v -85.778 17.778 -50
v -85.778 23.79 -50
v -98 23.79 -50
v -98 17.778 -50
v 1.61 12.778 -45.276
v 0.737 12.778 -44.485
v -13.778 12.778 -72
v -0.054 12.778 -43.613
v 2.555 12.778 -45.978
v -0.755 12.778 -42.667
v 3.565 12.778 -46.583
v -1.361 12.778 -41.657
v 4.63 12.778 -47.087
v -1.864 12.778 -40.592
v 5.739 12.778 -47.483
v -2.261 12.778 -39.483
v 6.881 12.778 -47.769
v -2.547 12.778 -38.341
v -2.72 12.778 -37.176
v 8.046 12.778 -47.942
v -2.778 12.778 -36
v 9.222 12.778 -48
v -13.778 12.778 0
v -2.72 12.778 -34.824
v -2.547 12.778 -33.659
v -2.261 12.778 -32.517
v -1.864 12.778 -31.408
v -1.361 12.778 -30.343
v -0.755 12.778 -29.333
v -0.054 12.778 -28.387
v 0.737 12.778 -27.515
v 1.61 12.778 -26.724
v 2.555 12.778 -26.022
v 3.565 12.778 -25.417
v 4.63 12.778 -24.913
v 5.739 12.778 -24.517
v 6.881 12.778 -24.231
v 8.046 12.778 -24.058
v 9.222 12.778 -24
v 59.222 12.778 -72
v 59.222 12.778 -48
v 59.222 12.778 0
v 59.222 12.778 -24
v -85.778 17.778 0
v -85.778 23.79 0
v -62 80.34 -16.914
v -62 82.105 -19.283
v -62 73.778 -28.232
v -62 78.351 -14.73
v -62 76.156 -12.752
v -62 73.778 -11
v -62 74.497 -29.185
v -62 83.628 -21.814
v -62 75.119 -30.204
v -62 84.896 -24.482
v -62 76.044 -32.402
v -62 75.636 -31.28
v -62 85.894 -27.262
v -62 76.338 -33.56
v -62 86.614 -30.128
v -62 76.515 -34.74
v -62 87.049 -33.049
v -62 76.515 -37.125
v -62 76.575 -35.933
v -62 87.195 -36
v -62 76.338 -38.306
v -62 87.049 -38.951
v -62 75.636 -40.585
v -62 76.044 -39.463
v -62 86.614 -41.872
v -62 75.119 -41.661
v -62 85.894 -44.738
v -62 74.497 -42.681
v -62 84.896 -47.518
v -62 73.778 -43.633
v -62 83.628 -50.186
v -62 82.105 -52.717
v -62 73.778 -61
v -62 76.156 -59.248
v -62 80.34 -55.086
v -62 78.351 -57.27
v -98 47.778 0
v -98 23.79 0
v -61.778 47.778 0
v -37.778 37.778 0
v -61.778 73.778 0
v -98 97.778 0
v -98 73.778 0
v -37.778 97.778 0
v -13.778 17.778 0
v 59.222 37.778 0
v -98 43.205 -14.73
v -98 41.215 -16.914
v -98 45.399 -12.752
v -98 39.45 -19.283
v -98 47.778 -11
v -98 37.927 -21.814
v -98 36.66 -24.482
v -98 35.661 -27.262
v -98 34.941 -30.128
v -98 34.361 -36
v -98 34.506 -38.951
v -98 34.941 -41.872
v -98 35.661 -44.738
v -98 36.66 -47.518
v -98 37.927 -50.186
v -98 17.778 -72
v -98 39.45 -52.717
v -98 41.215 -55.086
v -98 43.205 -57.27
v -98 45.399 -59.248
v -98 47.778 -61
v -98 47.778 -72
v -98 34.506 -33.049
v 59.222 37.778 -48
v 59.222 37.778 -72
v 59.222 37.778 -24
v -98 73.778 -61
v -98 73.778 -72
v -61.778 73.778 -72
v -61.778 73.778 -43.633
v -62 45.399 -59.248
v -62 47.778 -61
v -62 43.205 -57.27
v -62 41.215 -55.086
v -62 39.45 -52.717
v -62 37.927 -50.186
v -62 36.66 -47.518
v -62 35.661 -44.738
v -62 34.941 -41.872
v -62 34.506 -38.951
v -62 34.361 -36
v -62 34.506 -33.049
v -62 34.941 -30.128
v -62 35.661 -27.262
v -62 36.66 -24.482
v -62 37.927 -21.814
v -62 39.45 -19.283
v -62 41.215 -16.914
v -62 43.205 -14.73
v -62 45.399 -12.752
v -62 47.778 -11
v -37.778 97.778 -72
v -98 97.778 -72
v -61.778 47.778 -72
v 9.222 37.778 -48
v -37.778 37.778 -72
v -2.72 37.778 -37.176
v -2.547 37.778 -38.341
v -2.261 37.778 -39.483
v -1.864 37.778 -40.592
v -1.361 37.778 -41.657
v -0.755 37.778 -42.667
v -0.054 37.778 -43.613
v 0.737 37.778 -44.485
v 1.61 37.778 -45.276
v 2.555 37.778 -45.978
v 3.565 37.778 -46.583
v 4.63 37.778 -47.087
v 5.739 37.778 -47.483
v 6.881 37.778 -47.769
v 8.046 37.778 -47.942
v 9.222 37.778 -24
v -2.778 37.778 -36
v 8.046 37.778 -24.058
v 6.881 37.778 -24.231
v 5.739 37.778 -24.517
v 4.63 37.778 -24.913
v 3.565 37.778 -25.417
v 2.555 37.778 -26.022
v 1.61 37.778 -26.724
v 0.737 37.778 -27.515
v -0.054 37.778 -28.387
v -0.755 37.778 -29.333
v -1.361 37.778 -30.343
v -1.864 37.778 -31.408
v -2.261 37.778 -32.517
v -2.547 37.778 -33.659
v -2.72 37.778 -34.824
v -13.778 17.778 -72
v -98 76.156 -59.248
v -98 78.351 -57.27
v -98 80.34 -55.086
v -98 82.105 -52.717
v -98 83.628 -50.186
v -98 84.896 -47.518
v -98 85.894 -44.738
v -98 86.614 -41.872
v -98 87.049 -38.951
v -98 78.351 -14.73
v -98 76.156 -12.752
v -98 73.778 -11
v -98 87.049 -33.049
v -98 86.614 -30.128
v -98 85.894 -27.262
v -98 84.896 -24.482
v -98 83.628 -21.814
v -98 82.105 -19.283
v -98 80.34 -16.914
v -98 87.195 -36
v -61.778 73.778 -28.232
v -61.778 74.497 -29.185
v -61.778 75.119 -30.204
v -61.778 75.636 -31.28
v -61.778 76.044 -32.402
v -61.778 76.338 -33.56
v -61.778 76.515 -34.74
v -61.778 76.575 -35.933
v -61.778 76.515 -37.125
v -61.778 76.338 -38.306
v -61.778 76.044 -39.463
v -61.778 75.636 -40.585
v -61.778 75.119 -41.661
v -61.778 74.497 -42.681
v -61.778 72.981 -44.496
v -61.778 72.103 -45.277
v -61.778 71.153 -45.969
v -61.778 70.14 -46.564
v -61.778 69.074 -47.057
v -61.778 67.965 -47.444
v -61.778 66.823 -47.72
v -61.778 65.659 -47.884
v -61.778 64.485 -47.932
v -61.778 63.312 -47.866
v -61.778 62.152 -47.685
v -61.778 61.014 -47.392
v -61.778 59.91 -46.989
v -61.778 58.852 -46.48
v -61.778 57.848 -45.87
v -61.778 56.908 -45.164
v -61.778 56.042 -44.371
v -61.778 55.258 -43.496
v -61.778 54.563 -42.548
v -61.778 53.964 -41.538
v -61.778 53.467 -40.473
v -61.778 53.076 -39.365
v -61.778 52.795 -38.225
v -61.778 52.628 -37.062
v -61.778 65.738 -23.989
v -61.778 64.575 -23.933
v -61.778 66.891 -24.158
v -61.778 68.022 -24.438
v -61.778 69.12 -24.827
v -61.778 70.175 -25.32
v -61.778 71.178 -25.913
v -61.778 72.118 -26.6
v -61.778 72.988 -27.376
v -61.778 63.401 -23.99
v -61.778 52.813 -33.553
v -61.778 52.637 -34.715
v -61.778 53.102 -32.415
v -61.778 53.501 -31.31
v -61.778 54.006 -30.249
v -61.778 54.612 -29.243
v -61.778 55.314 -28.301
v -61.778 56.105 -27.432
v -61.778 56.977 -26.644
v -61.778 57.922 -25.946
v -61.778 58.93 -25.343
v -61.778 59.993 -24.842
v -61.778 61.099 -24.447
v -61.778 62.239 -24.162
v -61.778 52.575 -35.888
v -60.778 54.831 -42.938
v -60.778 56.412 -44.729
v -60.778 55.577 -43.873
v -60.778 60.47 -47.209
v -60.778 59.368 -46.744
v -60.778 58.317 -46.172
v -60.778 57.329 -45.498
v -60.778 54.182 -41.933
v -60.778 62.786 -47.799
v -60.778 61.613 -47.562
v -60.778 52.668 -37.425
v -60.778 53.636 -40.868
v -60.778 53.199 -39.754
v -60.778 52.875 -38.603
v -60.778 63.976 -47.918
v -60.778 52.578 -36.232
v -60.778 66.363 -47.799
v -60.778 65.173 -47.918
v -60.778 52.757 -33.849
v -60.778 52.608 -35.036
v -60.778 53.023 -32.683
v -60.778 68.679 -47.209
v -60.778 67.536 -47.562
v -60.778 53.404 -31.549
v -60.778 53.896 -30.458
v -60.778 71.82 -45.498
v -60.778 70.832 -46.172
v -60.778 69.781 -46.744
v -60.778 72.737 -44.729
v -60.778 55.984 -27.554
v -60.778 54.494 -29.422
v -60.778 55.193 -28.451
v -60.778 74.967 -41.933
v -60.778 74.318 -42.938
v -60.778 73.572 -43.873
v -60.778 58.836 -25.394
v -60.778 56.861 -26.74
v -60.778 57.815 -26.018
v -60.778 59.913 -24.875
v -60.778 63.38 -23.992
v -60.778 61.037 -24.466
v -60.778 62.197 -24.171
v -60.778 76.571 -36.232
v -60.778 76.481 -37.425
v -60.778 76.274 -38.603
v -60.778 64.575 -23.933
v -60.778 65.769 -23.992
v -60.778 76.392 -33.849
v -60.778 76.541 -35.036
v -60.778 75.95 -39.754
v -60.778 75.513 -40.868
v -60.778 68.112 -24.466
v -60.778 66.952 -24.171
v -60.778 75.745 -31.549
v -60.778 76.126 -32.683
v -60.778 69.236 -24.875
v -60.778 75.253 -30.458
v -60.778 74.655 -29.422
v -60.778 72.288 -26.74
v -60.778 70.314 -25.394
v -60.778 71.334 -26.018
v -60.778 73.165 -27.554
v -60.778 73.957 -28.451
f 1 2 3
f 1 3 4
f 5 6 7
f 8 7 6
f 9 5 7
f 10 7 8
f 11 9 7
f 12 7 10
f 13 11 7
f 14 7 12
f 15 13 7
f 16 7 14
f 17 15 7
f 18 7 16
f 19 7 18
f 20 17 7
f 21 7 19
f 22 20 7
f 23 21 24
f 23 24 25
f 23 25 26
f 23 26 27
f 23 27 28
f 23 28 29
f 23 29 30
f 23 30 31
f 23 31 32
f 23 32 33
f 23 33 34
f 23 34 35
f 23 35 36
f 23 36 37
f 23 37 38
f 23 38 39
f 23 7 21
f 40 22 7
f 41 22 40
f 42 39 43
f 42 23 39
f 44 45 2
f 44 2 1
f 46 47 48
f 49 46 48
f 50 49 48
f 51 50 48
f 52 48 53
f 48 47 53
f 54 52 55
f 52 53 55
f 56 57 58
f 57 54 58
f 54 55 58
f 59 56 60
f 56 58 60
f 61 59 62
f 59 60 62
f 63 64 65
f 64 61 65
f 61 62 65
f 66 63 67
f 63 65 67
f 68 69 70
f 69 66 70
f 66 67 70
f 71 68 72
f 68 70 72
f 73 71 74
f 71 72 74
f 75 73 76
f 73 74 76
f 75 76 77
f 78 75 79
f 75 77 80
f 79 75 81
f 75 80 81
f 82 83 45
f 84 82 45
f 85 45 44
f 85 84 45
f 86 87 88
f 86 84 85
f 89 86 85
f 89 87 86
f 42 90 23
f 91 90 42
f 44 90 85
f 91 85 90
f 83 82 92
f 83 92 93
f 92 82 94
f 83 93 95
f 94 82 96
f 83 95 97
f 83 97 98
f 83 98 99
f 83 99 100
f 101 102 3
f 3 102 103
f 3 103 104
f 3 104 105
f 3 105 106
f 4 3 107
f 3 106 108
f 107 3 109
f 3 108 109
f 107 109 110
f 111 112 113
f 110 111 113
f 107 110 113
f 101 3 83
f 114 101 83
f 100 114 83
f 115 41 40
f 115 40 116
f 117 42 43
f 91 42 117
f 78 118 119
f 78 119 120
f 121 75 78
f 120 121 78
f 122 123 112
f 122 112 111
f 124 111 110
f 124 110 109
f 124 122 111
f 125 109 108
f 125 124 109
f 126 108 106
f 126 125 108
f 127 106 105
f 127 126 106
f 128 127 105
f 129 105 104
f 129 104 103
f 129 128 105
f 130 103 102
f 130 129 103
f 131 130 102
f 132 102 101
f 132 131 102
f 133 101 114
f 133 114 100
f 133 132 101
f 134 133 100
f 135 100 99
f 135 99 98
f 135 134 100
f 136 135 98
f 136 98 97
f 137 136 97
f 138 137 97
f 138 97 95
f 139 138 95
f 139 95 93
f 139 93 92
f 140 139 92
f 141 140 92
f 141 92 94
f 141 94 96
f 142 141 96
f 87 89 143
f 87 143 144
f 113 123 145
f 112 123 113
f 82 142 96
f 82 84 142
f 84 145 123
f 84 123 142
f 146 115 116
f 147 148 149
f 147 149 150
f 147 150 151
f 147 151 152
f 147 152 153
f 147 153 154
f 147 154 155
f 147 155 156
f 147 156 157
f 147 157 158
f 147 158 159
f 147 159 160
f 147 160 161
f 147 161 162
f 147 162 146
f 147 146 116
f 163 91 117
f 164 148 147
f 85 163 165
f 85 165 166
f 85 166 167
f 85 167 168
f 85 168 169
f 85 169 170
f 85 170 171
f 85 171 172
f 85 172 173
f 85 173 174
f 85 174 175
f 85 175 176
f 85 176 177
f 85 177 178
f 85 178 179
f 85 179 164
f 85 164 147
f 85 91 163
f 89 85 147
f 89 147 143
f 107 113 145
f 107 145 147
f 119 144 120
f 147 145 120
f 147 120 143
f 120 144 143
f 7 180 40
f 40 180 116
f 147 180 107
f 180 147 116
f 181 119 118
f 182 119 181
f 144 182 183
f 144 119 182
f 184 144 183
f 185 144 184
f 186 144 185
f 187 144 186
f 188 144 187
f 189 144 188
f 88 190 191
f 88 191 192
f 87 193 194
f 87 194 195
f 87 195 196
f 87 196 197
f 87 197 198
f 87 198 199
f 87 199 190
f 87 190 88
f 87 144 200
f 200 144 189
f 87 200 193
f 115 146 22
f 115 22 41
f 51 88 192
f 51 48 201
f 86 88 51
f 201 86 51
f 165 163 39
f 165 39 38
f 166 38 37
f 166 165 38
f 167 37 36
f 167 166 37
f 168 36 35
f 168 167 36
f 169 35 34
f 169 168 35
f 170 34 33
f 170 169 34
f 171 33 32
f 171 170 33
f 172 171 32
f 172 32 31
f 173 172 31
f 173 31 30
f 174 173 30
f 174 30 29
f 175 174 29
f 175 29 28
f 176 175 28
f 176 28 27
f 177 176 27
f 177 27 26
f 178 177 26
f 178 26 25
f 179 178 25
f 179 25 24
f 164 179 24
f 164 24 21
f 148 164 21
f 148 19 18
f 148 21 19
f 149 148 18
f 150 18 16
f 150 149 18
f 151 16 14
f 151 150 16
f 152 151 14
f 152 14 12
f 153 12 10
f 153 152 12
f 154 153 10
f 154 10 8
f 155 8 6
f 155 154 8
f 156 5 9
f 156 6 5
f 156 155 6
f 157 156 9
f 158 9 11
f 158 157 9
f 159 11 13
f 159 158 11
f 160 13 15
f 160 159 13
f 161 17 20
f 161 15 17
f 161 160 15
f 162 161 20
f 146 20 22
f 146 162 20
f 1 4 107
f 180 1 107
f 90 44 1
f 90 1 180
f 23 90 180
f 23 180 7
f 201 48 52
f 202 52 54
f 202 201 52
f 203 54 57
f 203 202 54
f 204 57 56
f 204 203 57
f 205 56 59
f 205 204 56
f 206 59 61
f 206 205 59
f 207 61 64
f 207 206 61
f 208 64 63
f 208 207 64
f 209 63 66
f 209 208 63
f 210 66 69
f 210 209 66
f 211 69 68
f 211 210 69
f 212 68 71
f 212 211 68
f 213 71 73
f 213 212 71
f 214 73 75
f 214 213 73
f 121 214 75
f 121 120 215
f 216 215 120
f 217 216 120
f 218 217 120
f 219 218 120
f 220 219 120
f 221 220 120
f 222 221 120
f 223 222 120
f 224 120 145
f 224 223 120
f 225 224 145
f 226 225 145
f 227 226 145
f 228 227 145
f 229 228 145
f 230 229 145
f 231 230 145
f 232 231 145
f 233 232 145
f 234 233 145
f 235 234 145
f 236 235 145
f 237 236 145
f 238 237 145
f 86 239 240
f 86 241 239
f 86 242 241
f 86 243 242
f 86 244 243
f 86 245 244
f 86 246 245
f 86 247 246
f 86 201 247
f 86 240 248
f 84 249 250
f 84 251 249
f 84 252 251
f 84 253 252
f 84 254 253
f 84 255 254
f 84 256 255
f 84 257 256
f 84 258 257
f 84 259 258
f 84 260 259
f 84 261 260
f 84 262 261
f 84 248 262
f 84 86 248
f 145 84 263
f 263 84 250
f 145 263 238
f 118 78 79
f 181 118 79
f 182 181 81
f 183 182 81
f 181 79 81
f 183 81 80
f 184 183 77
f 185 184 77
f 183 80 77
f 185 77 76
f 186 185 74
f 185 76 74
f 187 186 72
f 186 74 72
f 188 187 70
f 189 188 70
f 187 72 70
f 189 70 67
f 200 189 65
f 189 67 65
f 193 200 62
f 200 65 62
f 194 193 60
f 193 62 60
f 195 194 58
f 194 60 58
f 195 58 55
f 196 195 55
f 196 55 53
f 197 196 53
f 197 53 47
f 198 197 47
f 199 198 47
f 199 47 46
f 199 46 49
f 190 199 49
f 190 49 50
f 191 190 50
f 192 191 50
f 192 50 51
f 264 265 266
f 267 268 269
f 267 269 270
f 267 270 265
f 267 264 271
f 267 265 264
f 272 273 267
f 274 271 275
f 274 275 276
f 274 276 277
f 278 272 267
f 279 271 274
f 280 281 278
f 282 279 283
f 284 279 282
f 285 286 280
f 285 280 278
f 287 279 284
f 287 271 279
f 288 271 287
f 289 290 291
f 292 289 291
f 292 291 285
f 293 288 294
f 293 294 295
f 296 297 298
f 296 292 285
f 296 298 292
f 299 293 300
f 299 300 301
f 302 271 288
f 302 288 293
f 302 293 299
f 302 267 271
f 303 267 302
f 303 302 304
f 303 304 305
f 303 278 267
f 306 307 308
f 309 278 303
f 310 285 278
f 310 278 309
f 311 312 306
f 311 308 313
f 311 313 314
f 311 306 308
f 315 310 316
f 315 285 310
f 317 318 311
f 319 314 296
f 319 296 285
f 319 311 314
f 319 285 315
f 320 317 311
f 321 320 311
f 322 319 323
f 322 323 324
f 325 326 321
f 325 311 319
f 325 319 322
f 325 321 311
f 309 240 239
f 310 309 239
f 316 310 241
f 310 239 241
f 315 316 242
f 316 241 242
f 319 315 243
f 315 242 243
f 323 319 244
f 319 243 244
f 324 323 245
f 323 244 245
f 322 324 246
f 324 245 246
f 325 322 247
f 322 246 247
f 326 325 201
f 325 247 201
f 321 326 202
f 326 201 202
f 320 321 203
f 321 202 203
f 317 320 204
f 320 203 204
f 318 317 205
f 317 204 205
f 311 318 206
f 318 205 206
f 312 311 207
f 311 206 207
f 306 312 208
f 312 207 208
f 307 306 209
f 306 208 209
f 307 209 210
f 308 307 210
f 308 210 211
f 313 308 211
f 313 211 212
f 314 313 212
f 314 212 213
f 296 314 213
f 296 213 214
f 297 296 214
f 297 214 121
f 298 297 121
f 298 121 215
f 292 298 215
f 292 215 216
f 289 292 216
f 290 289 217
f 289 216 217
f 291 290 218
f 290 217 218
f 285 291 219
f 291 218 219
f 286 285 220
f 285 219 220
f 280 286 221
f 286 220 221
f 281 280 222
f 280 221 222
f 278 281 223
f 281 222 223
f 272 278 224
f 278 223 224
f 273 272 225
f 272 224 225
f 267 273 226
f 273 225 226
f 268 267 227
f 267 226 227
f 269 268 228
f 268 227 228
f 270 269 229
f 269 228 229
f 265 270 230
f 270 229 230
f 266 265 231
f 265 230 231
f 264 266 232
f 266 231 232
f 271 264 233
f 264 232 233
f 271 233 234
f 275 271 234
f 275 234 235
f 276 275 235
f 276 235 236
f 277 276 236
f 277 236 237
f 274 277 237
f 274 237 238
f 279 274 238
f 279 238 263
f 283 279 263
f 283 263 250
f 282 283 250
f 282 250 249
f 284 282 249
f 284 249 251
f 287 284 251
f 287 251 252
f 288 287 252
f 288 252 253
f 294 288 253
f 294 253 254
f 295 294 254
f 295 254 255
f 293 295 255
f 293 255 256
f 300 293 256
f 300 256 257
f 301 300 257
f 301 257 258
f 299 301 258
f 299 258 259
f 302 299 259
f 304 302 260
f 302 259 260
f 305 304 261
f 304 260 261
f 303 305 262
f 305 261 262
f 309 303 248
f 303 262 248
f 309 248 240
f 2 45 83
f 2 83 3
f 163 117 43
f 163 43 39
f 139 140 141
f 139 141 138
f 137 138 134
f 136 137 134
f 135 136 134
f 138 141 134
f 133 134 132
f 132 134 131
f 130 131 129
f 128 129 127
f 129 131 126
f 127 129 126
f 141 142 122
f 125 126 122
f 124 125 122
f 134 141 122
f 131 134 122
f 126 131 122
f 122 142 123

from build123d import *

# Parameters (mm, degrees)
BOSS_EXTRUDE7_DEPTH      = 72
CUT_EXTRUDE4_DEPTH       = 72
BOSS_EXTRUDE8_DEPTH      = 36
CUT_EXTRUDE10_DEPTH      = 30
SKETCH17_R               = 12
CUT_EXTRUDE11_DEPTH      = 30
CUT_EXTRUDE11_DEPTH_BACK = 1


with BuildPart() as part:
    # Sketch7 → Boss-Extrude7 (new body)
    with BuildSketch(Plane.XY):
        Polygon((-85.777777778, 17.777777778), (-13.777777778, 17.777777778), (-13.777777778, 12.777777778), (59.222222222, 12.777777778), (59.222222222, 37.777777778), (-13.777777778, 37.777777778), (-37.777777778, 37.777777778), (-37.777777778, 97.777777778), (-73.777777778, 97.777777778), (-73.777777778, 73.777777778), (-61.777777778, 73.777777778), (-61.777777778, 47.777777778), (-73.777777778, 47.777777778), (-85.777777778, 47.777777778), align=None)
    extrude(amount=-BOSS_EXTRUDE7_DEPTH)

    # Sketch9 → Cut-Extrude4 (cut)
    with BuildSketch(Plane(origin=(0, 37.777777778, 0), x_dir=(1, 0, 0), z_dir=(0, 1, 0))):
        with BuildLine():
            Line((59.222222222, 24), (9.222222222, 24))
            ThreePointArc((9.222222222, 24), (-2.777777778, 36), (9.222222222, 48))
            Line((9.222222222, 48), (59.222222222, 48))
            Line((59.222222222, 48), (59.222222222, 24))
        make_face()
    extrude(amount=-CUT_EXTRUDE4_DEPTH, mode=Mode.SUBTRACT)

    # Sketch12 → Boss-Extrude8 (add)
    with BuildSketch(Plane.ZY.offset(62)):
        with BuildLine():
            ThreePointArc((-61, 47.777777778), (-36, 34.36090173), (-11, 47.777777778))
            Line((-11, 47.777777778), (0, 47.777777778))
            Line((0, 47.777777778), (0, 23.789694875))
            Line((0, 23.789694875), (-50, 23.789694875))
            Line((-50, 23.789694875), (-50, 17.777777778))
            Line((-50, 17.777777778), (-72, 17.777777778))
            Line((-72, 17.777777778), (-72, 47.777777778))
            Line((-72, 47.777777778), (-61, 47.777777778))
        make_face()
        with BuildLine():
            Line((-72, 73.777777778), (-61, 73.777777778))
            ThreePointArc((-61, 73.777777778), (-36, 87.194653826), (-11, 73.777777778))
            Line((-11, 73.777777778), (0, 73.777777778))
            Line((0, 73.777777778), (0, 97.777777778))
            Line((0, 97.777777778), (-72, 97.777777778))
            Line((-72, 97.777777778), (-72, 73.777777778))
        make_face()
    extrude(amount=BOSS_EXTRUDE8_DEPTH)

    # Sketch13 → Cut-Extrude10 (cut)
    with BuildSketch(Plane.ZY.offset(62)):
        with BuildLine():
            ThreePointArc((-11, 47.777777778), (-36, 34.36090173), (-61, 47.777777778))
            Line((-61, 47.777777778), (-11, 47.777777778))
        make_face()
        with BuildLine():
            ThreePointArc((-61, 73.777777778), (-36, 87.194653826), (-11, 73.777777778))
            Line((-11, 73.777777778), (-28.562094012, 73.777777778))
            Line((-28.562094012, 73.777777778), (-43.437905988, 73.777777778))
            Line((-43.437905988, 73.777777778), (-61, 73.777777778))
        make_face()
    extrude(amount=CUT_EXTRUDE10_DEPTH, mode=Mode.SUBTRACT)

    # Sketch17 → Cut-Extrude11 (cut, two sides)
    with BuildSketch(Plane.ZY.offset(61.777777778)) as cut_extrude11_sk:
        with Locations((-35.93265931, 64.574548991)):
            Circle(SKETCH17_R)
    extrude(amount=CUT_EXTRUDE11_DEPTH, mode=Mode.SUBTRACT)
    extrude(cut_extrude11_sk.sketch, amount=-CUT_EXTRUDE11_DEPTH_BACK, mode=Mode.SUBTRACT)


solid = part.part
